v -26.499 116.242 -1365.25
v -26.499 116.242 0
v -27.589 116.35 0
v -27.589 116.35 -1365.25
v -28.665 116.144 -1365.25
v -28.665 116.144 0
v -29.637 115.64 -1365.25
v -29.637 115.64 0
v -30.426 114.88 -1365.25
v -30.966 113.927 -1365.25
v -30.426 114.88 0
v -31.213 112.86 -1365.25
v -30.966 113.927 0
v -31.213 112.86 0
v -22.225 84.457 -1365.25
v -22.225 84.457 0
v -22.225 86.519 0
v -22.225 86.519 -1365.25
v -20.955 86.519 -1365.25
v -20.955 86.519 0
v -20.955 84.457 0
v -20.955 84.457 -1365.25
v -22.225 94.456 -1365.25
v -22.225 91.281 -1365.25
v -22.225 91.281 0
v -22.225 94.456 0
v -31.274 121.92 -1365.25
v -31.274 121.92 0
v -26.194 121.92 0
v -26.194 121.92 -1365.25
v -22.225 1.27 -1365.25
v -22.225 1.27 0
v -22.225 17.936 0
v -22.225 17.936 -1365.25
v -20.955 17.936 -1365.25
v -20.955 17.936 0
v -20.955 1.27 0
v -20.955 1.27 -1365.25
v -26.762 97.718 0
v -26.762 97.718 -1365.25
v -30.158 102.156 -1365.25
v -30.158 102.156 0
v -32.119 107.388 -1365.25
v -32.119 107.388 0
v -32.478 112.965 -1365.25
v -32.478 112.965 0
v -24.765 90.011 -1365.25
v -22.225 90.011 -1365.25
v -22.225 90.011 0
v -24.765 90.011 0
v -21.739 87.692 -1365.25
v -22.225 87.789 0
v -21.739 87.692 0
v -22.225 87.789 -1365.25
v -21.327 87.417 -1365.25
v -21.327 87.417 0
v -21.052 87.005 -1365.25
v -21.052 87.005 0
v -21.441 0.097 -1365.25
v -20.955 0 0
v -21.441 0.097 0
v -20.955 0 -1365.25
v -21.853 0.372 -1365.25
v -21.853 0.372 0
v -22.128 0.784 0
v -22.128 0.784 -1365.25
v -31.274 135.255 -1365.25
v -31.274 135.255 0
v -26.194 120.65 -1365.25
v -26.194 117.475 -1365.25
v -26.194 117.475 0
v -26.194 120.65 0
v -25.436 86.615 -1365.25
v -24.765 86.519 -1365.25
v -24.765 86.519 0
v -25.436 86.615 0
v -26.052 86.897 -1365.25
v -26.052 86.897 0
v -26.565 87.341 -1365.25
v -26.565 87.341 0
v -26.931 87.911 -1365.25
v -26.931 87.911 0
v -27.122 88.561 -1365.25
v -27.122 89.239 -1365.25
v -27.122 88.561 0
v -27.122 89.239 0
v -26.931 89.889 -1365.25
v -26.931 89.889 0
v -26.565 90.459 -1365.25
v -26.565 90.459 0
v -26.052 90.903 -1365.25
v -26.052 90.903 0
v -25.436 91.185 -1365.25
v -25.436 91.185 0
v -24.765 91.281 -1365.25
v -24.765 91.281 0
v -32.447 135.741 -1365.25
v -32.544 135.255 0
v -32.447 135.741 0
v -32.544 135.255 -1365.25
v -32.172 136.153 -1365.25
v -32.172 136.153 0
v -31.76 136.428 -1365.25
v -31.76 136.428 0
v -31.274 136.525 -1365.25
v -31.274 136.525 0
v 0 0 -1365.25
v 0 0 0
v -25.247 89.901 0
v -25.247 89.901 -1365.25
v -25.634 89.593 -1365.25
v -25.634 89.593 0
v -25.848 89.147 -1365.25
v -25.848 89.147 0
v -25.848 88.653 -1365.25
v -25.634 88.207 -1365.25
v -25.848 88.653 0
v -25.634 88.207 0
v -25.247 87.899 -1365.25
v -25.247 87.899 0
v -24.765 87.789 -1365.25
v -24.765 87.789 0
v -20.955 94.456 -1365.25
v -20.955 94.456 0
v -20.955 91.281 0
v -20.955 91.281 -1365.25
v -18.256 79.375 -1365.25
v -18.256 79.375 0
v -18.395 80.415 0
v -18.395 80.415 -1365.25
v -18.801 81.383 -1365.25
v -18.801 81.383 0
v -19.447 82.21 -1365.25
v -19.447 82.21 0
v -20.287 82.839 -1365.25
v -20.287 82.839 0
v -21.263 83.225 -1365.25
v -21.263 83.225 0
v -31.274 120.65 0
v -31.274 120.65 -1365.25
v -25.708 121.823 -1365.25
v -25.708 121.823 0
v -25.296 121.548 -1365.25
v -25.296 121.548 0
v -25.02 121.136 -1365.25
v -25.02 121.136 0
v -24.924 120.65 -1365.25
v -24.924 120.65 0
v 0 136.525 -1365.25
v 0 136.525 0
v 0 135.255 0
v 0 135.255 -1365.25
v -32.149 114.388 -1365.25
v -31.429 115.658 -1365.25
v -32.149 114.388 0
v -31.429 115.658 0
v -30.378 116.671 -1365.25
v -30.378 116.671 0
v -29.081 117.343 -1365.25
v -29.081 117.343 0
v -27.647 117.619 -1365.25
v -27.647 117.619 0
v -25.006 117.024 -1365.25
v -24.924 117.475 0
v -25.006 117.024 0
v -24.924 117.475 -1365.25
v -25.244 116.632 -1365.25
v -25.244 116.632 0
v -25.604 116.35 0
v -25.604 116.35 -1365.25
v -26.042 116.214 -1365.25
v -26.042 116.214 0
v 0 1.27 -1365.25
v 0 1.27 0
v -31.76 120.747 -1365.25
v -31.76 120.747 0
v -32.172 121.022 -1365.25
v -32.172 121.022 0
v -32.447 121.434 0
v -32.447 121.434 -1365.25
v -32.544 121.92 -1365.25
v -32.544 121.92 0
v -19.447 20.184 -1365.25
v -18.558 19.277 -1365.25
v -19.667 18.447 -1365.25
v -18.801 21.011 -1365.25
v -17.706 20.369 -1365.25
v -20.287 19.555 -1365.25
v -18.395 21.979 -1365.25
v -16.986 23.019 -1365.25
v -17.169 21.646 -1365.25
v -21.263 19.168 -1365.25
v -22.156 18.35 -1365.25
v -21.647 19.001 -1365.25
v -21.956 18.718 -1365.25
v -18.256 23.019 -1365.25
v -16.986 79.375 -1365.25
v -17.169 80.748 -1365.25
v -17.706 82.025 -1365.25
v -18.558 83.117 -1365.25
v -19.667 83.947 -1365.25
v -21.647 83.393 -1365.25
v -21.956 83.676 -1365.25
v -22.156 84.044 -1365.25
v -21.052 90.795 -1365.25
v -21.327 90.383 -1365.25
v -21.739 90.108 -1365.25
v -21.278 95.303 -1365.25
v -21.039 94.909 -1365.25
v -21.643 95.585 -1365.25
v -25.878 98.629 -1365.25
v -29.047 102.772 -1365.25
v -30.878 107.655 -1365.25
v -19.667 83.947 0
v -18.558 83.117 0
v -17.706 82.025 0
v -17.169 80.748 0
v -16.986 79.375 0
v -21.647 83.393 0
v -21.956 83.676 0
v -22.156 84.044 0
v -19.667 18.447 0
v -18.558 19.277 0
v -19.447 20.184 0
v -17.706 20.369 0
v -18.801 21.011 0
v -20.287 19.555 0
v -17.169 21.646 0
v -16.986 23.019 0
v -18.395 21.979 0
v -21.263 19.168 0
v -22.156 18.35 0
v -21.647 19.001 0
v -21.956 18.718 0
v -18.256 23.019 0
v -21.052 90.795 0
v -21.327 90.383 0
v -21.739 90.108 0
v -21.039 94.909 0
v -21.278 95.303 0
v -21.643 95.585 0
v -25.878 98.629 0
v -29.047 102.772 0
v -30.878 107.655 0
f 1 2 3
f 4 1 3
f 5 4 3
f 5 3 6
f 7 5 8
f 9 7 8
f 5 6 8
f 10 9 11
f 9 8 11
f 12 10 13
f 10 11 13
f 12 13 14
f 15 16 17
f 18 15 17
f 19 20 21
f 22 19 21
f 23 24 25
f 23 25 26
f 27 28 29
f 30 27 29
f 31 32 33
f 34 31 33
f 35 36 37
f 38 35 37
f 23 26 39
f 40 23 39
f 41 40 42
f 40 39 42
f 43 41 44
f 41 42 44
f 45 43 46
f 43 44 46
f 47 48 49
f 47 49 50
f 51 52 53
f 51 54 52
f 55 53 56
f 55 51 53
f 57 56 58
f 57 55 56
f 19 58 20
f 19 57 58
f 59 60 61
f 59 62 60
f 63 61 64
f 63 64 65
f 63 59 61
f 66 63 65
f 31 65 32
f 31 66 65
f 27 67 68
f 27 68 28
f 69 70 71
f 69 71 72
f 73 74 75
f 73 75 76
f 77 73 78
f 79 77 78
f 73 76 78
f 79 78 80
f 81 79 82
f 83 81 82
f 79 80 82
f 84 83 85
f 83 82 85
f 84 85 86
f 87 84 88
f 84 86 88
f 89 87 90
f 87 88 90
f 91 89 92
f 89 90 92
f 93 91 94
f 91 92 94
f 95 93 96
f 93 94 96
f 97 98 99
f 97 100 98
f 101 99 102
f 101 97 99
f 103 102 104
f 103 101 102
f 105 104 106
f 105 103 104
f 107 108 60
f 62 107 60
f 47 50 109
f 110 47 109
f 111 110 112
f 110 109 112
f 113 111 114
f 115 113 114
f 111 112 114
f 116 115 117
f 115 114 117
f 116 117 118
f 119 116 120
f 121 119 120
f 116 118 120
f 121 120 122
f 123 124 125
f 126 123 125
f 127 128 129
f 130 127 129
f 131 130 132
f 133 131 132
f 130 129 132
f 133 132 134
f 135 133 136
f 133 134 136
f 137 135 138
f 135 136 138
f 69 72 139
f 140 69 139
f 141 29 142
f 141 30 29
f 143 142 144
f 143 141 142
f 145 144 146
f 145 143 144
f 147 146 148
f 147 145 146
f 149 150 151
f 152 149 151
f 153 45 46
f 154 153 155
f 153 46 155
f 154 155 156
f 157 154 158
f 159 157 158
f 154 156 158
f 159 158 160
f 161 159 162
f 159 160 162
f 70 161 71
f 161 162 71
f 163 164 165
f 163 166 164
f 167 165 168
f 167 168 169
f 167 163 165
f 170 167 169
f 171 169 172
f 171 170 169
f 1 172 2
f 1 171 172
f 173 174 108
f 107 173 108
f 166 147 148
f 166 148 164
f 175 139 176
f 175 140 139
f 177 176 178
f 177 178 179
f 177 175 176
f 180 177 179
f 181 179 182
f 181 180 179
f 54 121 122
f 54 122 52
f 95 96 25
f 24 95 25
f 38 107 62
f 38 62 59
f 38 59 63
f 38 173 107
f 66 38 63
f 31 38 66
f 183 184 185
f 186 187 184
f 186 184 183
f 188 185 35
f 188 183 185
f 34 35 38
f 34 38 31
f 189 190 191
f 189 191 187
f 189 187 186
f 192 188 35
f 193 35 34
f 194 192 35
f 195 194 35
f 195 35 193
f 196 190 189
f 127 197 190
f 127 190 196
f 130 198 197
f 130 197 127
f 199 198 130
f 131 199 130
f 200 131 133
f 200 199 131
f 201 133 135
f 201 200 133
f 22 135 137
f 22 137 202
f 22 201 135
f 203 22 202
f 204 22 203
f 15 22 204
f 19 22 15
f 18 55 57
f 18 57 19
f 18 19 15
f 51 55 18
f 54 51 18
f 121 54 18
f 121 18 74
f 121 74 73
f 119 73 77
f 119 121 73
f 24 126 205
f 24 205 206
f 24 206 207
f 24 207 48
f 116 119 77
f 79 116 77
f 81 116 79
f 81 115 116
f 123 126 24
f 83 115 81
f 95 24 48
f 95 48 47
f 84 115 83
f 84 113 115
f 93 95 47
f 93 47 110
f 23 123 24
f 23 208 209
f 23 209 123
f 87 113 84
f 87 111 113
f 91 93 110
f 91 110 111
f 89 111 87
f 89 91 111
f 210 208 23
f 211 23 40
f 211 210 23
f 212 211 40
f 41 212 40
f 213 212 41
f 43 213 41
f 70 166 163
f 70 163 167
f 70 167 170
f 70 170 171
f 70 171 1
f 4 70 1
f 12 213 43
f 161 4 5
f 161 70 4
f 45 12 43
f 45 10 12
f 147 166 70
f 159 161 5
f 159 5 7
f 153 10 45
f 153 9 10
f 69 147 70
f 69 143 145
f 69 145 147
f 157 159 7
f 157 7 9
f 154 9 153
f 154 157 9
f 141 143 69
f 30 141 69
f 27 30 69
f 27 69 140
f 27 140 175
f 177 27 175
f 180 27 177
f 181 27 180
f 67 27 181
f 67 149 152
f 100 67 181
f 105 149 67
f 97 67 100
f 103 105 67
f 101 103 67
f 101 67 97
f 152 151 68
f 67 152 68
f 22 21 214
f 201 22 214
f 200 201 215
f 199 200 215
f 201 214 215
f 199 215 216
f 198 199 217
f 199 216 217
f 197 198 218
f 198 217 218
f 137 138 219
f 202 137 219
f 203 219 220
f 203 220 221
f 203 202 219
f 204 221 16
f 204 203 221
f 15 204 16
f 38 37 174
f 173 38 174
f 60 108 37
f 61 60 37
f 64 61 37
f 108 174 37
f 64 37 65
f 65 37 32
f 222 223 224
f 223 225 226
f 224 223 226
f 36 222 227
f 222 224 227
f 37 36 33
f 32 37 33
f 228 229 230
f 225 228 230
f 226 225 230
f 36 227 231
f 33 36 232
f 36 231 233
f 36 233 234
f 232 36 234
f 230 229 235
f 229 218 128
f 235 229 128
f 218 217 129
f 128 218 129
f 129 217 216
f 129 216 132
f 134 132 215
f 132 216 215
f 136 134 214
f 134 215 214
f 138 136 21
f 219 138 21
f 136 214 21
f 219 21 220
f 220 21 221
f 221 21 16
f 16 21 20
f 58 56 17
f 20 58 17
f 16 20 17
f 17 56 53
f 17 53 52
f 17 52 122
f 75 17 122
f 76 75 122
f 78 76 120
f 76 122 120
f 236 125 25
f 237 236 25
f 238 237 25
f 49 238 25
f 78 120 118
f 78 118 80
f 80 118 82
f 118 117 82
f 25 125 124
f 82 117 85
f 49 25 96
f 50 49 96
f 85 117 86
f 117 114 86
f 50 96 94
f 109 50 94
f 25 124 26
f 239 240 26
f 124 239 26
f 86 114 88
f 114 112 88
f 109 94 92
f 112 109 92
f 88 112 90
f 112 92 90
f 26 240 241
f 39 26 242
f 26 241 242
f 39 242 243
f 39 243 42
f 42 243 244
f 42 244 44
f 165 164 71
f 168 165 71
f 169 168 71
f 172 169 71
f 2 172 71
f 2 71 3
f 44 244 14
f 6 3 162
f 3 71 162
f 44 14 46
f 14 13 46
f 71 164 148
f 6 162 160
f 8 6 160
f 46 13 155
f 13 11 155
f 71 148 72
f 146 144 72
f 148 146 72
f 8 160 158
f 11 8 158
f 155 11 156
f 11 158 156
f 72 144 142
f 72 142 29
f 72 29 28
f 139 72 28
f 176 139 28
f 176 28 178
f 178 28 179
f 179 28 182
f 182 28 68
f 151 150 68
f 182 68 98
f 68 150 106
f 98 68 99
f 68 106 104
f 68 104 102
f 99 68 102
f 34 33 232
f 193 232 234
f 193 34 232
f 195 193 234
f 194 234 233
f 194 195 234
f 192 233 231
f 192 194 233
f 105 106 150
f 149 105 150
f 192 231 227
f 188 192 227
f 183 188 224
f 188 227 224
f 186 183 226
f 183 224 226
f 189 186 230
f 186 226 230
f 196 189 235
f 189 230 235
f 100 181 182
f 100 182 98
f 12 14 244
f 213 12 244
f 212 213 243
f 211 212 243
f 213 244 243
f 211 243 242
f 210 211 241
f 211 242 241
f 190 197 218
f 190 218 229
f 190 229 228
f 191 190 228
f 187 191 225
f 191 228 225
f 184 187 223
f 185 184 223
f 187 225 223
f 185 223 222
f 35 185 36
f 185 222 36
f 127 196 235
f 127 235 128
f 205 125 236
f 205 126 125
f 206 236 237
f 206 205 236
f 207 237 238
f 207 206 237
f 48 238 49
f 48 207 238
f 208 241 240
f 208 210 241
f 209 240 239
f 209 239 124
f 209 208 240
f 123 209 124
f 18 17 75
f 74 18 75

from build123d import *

# Parameters (mm, degrees)
EXTRUDE_THIN1_DEPTH = 1365.25
FILLET1_R           = 1.27


with BuildPart() as part:
    # Sketch1 → Extrude-Thin1 (new body)
    with BuildSketch(Plane.XY):
        with BuildLine():
            Line((0, 0), (-22.225, 0))
            Line((-22.225, 0), (-22.225, 19.05))
            ThreePointArc((-22.225, 19.05), (-19.418669962, 20.212419962), (-18.25625, 23.01875))
            Line((-18.25625, 23.01875), (-18.25625, 79.375))
            ThreePointArc((-18.25625, 79.375), (-19.418669962, 82.181330038), (-22.225, 83.34375))
            Line((-22.225, 83.34375), (-22.225, 86.51875))
            Line((-22.225, 86.51875), (-24.765, 86.51875))
            ThreePointArc((-24.765, 86.51875), (-27.14625, 88.9), (-24.765, 91.28125))
            Line((-24.765, 91.28125), (-22.225, 91.28125))
            Line((-22.225, 91.28125), (-22.225, 94.45625))
            ThreePointArc((-22.225, 94.45625), (-30.157584675, 102.15609622), (-32.478342254, 112.964778641))
            ThreePointArc((-32.478342254, 112.964778641), (-30.377697482, 116.671337824), (-26.19375, 117.475))
            Line((-26.19375, 117.475), (-26.19375, 120.65))
            Line((-26.19375, 120.65), (-32.54375, 120.65))
            Line((-32.54375, 120.65), (-32.54375, 136.525))
            Line((-32.54375, 136.525), (0, 136.525))
            Line((0, 136.525), (0, 135.255))
            Line((0, 135.255), (-31.27375, 135.255))
            Line((-31.27375, 135.255), (-31.27375, 121.92))
            Line((-31.27375, 121.92), (-24.92375, 121.92))
            Line((-24.92375, 121.92), (-24.92375, 115.426165066))
            ThreePointArc((-24.92375, 115.426165066), (-28.855388092, 116.071729842), (-31.21270277, 112.859627808))
            ThreePointArc((-31.21270277, 112.859627808), (-28.857537425, 102.438637116), (-20.955, 95.248800326))
            Line((-20.955, 95.248800326), (-20.955, 90.01125))
            Line((-20.955, 90.01125), (-24.765, 90.01125))
            ThreePointArc((-24.765, 90.01125), (-25.87625, 88.9), (-24.765, 87.78875))
            Line((-24.765, 87.78875), (-20.955, 87.78875))
            Line((-20.955, 87.78875), (-20.955, 84.457479863))
            ThreePointArc((-20.955, 84.457479863), (-18.09597384, 82.599227742), (-16.98625, 79.375))
            Line((-16.98625, 79.375), (-16.98625, 23.01875))
            ThreePointArc((-16.98625, 23.01875), (-18.09597384, 19.794522258), (-20.955, 17.936270137))
            Line((-20.955, 17.936270137), (-20.955, 1.27))
            Line((-20.955, 1.27), (0, 1.27))
            Line((0, 1.27), (0, 0))
        make_face()
    extrude(amount=-EXTRUDE_THIN1_DEPTH)

    # Fillet1
    fillet1_edges = [part.edges().sort_by_distance(p)[0] for p in [
        (-24.92375, 121.92, -682.625),
        (-24.92375, 115.426165066, -682.625),
        (-20.955, 95.248800326, -682.625),
        (-20.955, 90.01125, -682.625),
        (-20.955, 87.78875, -682.625),
        (-22.225, 0, -682.625),
        (-22.225, 19.05, -682.625),
        (-22.225, 83.34375, -682.625),
        (-32.54375, 120.65, -682.625),
        (-32.54375, 136.525, -682.625),
    ]]
    fillet(fillet1_edges, radius=FILLET1_R)


solid = part.part
